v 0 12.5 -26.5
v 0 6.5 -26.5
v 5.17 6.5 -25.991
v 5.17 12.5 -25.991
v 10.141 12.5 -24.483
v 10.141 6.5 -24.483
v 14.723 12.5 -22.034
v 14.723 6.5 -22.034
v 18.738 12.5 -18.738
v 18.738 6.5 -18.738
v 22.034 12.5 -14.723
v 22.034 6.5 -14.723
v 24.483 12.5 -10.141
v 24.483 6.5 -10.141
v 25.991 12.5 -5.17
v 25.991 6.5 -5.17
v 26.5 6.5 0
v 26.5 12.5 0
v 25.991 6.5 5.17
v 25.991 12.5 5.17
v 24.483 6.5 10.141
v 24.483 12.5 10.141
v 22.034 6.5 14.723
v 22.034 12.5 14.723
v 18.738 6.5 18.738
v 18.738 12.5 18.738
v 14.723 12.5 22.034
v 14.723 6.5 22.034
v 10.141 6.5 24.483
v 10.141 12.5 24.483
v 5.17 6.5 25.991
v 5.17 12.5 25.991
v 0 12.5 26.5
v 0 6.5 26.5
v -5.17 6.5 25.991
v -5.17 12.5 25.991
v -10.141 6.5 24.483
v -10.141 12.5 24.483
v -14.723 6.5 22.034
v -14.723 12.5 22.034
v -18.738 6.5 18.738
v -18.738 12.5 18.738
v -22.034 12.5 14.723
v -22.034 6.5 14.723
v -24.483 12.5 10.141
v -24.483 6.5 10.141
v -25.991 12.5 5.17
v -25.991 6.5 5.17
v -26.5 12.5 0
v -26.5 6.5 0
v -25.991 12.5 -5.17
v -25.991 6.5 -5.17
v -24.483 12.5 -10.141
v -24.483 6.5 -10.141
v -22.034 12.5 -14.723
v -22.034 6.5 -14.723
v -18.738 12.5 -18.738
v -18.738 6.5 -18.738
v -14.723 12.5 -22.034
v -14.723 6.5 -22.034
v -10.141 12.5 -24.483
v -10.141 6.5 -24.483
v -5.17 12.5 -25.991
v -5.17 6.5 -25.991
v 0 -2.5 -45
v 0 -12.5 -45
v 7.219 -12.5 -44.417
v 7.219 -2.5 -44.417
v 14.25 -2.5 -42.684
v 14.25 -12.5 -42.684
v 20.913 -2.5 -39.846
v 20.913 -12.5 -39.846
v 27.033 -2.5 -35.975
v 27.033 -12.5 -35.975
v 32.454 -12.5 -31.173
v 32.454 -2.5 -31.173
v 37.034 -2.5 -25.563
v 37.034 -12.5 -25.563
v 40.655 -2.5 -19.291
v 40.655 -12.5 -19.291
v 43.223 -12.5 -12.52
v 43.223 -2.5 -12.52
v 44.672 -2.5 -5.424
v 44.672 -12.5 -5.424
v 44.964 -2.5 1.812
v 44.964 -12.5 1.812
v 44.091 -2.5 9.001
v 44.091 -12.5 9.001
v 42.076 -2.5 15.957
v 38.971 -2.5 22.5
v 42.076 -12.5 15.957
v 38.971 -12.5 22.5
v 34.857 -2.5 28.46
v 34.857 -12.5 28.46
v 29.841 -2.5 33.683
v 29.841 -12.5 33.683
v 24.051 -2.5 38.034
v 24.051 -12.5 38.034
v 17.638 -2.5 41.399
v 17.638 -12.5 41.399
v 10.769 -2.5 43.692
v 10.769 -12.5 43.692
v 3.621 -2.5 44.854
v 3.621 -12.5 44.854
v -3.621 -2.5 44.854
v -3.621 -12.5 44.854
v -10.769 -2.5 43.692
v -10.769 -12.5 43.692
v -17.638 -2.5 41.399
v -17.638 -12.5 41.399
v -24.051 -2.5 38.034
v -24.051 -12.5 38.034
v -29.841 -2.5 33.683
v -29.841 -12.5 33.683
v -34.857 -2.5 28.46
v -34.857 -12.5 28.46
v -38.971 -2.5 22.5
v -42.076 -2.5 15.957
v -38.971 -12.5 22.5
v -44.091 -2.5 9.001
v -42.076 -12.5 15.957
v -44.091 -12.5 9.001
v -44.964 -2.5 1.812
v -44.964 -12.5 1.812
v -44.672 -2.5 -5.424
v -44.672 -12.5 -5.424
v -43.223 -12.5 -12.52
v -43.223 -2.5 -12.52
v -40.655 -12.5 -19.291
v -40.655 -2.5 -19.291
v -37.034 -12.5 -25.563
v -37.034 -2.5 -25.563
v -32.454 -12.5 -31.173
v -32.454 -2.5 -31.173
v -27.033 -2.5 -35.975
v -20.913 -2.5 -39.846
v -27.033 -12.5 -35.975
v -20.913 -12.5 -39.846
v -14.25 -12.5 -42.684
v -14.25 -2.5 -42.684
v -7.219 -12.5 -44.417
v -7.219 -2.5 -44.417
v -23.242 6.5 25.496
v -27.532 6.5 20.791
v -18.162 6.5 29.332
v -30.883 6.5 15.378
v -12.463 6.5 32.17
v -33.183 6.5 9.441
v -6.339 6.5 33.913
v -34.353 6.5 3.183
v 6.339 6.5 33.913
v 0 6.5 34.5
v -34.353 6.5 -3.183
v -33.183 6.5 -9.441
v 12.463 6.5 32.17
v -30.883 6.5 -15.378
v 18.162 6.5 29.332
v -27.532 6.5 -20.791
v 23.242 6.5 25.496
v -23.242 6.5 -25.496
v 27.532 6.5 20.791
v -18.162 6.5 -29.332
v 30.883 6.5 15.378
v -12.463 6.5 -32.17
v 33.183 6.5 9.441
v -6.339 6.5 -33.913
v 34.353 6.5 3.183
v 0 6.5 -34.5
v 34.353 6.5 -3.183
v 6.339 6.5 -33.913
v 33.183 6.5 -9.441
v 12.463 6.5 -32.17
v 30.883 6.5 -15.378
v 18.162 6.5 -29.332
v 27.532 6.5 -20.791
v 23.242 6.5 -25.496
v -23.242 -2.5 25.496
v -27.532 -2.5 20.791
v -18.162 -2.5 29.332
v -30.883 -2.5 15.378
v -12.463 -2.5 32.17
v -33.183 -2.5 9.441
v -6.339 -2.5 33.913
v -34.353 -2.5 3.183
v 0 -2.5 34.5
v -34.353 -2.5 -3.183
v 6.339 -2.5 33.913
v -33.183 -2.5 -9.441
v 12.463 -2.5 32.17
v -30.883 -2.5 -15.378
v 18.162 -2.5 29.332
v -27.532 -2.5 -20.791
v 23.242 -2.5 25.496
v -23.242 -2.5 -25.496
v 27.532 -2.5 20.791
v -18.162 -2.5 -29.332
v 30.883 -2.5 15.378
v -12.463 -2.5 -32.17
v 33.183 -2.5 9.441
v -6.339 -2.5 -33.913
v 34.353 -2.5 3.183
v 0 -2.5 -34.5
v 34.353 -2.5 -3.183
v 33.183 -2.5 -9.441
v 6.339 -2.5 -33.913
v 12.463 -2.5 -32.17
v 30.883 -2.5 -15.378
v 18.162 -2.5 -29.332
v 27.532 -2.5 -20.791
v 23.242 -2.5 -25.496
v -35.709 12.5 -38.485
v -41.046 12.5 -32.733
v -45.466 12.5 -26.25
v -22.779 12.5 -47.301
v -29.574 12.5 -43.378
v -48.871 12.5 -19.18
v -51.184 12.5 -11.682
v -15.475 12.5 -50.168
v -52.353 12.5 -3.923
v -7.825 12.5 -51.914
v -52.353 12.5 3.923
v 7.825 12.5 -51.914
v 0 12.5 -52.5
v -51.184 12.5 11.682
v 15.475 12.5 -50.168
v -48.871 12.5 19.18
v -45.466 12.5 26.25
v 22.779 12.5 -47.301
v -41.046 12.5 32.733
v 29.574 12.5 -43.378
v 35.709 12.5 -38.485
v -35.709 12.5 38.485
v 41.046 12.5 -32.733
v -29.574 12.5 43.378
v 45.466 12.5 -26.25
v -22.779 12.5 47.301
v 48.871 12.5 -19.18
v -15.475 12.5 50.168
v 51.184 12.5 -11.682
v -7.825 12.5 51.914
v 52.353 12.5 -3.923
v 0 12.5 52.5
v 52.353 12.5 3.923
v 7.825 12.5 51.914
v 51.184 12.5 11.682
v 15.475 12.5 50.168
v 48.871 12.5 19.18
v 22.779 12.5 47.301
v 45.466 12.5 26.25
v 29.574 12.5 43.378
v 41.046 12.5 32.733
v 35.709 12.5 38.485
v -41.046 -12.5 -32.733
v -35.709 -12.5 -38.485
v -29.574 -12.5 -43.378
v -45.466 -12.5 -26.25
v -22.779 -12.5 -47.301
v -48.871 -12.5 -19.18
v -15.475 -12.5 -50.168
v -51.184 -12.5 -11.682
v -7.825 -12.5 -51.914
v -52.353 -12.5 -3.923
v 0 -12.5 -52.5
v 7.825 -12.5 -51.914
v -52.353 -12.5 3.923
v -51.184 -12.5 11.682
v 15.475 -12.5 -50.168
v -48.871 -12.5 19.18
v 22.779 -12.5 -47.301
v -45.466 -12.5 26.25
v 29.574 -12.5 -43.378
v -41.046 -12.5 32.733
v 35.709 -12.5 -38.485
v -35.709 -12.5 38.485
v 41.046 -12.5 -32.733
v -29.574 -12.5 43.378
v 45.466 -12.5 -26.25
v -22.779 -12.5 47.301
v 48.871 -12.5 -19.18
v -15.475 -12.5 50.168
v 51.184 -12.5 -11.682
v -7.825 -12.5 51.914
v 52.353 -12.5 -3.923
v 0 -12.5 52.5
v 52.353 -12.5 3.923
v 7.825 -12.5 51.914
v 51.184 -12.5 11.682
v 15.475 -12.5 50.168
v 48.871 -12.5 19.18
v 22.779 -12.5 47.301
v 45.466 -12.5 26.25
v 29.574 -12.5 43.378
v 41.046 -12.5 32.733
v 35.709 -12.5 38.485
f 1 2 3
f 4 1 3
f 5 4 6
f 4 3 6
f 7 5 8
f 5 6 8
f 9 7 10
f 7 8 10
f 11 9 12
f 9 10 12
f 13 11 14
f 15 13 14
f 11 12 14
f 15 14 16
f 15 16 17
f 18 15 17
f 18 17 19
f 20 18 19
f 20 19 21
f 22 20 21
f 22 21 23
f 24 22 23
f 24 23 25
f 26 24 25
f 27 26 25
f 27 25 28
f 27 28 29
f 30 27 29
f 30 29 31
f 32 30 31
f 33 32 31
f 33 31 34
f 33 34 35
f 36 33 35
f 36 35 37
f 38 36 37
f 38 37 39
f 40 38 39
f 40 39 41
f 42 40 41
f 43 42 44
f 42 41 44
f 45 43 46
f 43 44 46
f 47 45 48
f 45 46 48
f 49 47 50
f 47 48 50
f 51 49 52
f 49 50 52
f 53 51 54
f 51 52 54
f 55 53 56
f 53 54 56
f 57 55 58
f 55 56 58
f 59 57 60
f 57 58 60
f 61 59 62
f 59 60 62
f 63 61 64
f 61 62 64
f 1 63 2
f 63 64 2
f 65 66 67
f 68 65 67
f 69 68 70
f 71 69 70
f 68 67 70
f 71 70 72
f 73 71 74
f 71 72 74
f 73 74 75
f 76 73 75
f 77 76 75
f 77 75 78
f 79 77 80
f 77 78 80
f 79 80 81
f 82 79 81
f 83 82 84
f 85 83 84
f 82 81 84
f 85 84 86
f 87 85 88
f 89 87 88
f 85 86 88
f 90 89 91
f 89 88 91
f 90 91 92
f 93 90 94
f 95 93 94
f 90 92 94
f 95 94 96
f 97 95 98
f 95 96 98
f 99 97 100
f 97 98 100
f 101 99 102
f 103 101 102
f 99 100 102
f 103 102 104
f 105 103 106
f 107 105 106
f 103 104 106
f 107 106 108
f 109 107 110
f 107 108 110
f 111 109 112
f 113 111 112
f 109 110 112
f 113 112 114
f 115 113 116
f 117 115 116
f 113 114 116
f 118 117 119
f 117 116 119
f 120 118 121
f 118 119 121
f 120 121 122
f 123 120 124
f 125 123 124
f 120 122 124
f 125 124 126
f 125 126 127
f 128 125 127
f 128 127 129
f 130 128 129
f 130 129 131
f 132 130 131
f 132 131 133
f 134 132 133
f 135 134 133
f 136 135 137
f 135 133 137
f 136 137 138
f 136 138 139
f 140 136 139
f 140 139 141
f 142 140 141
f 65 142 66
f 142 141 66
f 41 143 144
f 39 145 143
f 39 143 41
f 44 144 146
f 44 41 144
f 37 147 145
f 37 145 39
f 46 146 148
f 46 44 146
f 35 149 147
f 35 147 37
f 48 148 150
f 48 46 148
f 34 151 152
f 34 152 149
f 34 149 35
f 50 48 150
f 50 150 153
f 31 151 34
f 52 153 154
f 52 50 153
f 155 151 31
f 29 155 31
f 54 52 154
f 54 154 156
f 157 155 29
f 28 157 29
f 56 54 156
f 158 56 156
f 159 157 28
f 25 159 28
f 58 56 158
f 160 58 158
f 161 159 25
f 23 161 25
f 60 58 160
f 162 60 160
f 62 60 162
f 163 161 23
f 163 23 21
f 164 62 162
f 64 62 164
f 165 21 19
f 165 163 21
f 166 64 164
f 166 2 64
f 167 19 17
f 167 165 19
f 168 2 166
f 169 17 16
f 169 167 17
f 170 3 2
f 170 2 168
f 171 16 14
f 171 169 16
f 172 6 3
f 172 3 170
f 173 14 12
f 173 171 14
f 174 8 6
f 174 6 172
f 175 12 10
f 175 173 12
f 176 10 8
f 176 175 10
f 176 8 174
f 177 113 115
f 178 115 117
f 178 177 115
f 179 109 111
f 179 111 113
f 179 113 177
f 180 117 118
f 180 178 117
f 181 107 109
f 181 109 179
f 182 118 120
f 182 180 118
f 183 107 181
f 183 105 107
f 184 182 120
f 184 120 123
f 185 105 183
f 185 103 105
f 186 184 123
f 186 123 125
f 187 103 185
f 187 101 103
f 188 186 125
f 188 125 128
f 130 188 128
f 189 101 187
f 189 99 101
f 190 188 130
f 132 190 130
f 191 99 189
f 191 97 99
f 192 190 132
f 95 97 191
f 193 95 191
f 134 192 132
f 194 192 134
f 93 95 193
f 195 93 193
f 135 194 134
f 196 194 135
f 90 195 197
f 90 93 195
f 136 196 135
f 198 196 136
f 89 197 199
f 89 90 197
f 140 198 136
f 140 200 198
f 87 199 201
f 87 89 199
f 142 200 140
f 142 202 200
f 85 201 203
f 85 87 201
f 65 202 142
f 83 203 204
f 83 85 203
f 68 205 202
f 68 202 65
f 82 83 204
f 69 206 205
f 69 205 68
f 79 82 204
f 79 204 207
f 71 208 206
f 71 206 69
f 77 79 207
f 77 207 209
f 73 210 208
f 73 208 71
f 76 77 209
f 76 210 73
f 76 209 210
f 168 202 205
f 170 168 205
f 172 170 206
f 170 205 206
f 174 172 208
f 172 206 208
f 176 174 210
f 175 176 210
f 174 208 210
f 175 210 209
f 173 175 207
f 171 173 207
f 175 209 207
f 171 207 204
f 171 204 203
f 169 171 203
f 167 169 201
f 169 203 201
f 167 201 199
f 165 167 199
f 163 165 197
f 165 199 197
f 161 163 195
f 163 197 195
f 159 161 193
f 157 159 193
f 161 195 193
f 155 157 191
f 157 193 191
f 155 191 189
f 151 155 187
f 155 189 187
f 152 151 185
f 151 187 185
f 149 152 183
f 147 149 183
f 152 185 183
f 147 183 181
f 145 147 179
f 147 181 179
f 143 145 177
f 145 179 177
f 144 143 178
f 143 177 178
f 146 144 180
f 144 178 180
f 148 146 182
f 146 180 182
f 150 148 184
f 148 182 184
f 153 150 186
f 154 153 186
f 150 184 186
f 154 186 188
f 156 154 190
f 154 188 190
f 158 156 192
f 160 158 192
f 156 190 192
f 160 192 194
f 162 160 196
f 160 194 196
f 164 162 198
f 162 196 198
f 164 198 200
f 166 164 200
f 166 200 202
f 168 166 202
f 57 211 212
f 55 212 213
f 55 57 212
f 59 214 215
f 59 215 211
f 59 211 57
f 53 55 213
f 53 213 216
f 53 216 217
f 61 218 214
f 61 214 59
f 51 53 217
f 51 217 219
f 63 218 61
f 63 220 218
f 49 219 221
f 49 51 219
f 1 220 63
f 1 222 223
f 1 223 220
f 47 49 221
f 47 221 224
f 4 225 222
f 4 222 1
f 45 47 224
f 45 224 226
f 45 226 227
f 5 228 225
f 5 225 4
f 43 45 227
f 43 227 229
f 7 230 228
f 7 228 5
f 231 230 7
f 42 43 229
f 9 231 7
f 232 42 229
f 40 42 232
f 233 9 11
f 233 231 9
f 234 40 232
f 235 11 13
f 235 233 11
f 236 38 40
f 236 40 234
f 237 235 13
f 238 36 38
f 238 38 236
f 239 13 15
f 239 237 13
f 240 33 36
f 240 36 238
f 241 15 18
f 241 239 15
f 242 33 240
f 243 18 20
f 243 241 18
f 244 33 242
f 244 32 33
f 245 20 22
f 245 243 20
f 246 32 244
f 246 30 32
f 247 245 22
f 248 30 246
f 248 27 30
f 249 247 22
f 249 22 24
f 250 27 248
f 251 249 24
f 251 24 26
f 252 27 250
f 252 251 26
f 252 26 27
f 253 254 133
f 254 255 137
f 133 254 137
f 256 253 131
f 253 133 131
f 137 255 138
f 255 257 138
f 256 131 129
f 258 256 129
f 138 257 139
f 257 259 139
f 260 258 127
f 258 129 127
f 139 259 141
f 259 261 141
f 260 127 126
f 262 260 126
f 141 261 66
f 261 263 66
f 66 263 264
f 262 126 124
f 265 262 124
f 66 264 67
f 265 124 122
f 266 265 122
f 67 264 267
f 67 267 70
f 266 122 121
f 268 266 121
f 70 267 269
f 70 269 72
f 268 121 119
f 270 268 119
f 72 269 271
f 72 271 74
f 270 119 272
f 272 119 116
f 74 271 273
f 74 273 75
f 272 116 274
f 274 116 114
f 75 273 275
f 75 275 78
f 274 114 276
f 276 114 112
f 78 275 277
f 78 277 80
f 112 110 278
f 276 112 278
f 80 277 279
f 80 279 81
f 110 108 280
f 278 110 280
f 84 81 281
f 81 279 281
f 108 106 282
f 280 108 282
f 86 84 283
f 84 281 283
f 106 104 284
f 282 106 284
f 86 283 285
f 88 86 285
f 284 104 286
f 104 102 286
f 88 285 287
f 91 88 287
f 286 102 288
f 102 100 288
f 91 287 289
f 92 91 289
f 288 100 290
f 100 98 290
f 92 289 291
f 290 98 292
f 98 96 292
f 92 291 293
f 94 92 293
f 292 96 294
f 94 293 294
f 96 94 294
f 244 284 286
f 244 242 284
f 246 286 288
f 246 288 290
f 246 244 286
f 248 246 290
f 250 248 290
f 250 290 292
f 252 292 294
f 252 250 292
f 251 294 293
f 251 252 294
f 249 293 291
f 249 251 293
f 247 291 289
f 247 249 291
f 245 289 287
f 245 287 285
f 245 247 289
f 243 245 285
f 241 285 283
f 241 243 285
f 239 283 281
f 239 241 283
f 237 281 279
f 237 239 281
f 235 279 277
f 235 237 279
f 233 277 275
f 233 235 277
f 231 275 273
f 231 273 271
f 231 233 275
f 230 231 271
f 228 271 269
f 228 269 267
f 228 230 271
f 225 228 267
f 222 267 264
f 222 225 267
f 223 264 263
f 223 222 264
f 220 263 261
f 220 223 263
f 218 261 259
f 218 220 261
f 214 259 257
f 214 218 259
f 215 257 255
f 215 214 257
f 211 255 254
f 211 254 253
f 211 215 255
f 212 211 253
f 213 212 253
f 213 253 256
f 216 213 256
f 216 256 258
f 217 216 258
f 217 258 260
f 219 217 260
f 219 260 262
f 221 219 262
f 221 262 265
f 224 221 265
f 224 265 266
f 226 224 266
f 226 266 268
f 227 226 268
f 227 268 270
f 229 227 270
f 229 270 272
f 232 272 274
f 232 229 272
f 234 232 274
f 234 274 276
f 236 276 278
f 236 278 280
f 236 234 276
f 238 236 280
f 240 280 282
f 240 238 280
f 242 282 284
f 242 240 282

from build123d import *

# Parameters (mm, degrees)
SKETCH1_R           = 52.5
BOSS_EXTRUDE1_DEPTH = 12.5
SKETCH3_R           = 45
CUT_EXTRUDE1_DEPTH  = 10
SKETCH4_R           = 34.5
CUT_EXTRUDE2_DEPTH  = 9
SKETCH5_R           = 26.5
CUT_EXTRUDE3_DEPTH  = 22


with BuildPart() as part:
    # Sketch1 → Boss-Extrude1 (new, symmetric)
    with BuildSketch(Plane(origin=(0, 0, 0), x_dir=(-1, 0, 0), z_dir=(0, 1, 0))):
        with Locations(Location((0, 0, 0), (0, 0, 90))):
            Circle(SKETCH1_R)
    extrude(amount=BOSS_EXTRUDE1_DEPTH, both=True)

    # Sketch3 → Cut-Extrude1 (cut)
    with BuildSketch(Plane.XZ.offset(12.5)):
        with Locations(Location((0, 0, 0), (0, 0, 270))):
            Circle(SKETCH3_R)
    extrude(amount=-CUT_EXTRUDE1_DEPTH, mode=Mode.SUBTRACT)

    # Sketch4 → Cut-Extrude2 (cut)
    with BuildSketch(Plane.XZ.offset(2.5)):
        with Locations(Location((0, 0, 0), (0, 0, 270))):
            Circle(SKETCH4_R)
    extrude(amount=-CUT_EXTRUDE2_DEPTH, mode=Mode.SUBTRACT)

    # Sketch5 → Cut-Extrude3 (cut)
    with BuildSketch(Plane.XZ.offset(-6.5)):
        with Locations(Location((0, 0, 0), (0, 0, 270))):
            Circle(SKETCH5_R)
    extrude(amount=-CUT_EXTRUDE3_DEPTH, mode=Mode.SUBTRACT)


solid = part.part
